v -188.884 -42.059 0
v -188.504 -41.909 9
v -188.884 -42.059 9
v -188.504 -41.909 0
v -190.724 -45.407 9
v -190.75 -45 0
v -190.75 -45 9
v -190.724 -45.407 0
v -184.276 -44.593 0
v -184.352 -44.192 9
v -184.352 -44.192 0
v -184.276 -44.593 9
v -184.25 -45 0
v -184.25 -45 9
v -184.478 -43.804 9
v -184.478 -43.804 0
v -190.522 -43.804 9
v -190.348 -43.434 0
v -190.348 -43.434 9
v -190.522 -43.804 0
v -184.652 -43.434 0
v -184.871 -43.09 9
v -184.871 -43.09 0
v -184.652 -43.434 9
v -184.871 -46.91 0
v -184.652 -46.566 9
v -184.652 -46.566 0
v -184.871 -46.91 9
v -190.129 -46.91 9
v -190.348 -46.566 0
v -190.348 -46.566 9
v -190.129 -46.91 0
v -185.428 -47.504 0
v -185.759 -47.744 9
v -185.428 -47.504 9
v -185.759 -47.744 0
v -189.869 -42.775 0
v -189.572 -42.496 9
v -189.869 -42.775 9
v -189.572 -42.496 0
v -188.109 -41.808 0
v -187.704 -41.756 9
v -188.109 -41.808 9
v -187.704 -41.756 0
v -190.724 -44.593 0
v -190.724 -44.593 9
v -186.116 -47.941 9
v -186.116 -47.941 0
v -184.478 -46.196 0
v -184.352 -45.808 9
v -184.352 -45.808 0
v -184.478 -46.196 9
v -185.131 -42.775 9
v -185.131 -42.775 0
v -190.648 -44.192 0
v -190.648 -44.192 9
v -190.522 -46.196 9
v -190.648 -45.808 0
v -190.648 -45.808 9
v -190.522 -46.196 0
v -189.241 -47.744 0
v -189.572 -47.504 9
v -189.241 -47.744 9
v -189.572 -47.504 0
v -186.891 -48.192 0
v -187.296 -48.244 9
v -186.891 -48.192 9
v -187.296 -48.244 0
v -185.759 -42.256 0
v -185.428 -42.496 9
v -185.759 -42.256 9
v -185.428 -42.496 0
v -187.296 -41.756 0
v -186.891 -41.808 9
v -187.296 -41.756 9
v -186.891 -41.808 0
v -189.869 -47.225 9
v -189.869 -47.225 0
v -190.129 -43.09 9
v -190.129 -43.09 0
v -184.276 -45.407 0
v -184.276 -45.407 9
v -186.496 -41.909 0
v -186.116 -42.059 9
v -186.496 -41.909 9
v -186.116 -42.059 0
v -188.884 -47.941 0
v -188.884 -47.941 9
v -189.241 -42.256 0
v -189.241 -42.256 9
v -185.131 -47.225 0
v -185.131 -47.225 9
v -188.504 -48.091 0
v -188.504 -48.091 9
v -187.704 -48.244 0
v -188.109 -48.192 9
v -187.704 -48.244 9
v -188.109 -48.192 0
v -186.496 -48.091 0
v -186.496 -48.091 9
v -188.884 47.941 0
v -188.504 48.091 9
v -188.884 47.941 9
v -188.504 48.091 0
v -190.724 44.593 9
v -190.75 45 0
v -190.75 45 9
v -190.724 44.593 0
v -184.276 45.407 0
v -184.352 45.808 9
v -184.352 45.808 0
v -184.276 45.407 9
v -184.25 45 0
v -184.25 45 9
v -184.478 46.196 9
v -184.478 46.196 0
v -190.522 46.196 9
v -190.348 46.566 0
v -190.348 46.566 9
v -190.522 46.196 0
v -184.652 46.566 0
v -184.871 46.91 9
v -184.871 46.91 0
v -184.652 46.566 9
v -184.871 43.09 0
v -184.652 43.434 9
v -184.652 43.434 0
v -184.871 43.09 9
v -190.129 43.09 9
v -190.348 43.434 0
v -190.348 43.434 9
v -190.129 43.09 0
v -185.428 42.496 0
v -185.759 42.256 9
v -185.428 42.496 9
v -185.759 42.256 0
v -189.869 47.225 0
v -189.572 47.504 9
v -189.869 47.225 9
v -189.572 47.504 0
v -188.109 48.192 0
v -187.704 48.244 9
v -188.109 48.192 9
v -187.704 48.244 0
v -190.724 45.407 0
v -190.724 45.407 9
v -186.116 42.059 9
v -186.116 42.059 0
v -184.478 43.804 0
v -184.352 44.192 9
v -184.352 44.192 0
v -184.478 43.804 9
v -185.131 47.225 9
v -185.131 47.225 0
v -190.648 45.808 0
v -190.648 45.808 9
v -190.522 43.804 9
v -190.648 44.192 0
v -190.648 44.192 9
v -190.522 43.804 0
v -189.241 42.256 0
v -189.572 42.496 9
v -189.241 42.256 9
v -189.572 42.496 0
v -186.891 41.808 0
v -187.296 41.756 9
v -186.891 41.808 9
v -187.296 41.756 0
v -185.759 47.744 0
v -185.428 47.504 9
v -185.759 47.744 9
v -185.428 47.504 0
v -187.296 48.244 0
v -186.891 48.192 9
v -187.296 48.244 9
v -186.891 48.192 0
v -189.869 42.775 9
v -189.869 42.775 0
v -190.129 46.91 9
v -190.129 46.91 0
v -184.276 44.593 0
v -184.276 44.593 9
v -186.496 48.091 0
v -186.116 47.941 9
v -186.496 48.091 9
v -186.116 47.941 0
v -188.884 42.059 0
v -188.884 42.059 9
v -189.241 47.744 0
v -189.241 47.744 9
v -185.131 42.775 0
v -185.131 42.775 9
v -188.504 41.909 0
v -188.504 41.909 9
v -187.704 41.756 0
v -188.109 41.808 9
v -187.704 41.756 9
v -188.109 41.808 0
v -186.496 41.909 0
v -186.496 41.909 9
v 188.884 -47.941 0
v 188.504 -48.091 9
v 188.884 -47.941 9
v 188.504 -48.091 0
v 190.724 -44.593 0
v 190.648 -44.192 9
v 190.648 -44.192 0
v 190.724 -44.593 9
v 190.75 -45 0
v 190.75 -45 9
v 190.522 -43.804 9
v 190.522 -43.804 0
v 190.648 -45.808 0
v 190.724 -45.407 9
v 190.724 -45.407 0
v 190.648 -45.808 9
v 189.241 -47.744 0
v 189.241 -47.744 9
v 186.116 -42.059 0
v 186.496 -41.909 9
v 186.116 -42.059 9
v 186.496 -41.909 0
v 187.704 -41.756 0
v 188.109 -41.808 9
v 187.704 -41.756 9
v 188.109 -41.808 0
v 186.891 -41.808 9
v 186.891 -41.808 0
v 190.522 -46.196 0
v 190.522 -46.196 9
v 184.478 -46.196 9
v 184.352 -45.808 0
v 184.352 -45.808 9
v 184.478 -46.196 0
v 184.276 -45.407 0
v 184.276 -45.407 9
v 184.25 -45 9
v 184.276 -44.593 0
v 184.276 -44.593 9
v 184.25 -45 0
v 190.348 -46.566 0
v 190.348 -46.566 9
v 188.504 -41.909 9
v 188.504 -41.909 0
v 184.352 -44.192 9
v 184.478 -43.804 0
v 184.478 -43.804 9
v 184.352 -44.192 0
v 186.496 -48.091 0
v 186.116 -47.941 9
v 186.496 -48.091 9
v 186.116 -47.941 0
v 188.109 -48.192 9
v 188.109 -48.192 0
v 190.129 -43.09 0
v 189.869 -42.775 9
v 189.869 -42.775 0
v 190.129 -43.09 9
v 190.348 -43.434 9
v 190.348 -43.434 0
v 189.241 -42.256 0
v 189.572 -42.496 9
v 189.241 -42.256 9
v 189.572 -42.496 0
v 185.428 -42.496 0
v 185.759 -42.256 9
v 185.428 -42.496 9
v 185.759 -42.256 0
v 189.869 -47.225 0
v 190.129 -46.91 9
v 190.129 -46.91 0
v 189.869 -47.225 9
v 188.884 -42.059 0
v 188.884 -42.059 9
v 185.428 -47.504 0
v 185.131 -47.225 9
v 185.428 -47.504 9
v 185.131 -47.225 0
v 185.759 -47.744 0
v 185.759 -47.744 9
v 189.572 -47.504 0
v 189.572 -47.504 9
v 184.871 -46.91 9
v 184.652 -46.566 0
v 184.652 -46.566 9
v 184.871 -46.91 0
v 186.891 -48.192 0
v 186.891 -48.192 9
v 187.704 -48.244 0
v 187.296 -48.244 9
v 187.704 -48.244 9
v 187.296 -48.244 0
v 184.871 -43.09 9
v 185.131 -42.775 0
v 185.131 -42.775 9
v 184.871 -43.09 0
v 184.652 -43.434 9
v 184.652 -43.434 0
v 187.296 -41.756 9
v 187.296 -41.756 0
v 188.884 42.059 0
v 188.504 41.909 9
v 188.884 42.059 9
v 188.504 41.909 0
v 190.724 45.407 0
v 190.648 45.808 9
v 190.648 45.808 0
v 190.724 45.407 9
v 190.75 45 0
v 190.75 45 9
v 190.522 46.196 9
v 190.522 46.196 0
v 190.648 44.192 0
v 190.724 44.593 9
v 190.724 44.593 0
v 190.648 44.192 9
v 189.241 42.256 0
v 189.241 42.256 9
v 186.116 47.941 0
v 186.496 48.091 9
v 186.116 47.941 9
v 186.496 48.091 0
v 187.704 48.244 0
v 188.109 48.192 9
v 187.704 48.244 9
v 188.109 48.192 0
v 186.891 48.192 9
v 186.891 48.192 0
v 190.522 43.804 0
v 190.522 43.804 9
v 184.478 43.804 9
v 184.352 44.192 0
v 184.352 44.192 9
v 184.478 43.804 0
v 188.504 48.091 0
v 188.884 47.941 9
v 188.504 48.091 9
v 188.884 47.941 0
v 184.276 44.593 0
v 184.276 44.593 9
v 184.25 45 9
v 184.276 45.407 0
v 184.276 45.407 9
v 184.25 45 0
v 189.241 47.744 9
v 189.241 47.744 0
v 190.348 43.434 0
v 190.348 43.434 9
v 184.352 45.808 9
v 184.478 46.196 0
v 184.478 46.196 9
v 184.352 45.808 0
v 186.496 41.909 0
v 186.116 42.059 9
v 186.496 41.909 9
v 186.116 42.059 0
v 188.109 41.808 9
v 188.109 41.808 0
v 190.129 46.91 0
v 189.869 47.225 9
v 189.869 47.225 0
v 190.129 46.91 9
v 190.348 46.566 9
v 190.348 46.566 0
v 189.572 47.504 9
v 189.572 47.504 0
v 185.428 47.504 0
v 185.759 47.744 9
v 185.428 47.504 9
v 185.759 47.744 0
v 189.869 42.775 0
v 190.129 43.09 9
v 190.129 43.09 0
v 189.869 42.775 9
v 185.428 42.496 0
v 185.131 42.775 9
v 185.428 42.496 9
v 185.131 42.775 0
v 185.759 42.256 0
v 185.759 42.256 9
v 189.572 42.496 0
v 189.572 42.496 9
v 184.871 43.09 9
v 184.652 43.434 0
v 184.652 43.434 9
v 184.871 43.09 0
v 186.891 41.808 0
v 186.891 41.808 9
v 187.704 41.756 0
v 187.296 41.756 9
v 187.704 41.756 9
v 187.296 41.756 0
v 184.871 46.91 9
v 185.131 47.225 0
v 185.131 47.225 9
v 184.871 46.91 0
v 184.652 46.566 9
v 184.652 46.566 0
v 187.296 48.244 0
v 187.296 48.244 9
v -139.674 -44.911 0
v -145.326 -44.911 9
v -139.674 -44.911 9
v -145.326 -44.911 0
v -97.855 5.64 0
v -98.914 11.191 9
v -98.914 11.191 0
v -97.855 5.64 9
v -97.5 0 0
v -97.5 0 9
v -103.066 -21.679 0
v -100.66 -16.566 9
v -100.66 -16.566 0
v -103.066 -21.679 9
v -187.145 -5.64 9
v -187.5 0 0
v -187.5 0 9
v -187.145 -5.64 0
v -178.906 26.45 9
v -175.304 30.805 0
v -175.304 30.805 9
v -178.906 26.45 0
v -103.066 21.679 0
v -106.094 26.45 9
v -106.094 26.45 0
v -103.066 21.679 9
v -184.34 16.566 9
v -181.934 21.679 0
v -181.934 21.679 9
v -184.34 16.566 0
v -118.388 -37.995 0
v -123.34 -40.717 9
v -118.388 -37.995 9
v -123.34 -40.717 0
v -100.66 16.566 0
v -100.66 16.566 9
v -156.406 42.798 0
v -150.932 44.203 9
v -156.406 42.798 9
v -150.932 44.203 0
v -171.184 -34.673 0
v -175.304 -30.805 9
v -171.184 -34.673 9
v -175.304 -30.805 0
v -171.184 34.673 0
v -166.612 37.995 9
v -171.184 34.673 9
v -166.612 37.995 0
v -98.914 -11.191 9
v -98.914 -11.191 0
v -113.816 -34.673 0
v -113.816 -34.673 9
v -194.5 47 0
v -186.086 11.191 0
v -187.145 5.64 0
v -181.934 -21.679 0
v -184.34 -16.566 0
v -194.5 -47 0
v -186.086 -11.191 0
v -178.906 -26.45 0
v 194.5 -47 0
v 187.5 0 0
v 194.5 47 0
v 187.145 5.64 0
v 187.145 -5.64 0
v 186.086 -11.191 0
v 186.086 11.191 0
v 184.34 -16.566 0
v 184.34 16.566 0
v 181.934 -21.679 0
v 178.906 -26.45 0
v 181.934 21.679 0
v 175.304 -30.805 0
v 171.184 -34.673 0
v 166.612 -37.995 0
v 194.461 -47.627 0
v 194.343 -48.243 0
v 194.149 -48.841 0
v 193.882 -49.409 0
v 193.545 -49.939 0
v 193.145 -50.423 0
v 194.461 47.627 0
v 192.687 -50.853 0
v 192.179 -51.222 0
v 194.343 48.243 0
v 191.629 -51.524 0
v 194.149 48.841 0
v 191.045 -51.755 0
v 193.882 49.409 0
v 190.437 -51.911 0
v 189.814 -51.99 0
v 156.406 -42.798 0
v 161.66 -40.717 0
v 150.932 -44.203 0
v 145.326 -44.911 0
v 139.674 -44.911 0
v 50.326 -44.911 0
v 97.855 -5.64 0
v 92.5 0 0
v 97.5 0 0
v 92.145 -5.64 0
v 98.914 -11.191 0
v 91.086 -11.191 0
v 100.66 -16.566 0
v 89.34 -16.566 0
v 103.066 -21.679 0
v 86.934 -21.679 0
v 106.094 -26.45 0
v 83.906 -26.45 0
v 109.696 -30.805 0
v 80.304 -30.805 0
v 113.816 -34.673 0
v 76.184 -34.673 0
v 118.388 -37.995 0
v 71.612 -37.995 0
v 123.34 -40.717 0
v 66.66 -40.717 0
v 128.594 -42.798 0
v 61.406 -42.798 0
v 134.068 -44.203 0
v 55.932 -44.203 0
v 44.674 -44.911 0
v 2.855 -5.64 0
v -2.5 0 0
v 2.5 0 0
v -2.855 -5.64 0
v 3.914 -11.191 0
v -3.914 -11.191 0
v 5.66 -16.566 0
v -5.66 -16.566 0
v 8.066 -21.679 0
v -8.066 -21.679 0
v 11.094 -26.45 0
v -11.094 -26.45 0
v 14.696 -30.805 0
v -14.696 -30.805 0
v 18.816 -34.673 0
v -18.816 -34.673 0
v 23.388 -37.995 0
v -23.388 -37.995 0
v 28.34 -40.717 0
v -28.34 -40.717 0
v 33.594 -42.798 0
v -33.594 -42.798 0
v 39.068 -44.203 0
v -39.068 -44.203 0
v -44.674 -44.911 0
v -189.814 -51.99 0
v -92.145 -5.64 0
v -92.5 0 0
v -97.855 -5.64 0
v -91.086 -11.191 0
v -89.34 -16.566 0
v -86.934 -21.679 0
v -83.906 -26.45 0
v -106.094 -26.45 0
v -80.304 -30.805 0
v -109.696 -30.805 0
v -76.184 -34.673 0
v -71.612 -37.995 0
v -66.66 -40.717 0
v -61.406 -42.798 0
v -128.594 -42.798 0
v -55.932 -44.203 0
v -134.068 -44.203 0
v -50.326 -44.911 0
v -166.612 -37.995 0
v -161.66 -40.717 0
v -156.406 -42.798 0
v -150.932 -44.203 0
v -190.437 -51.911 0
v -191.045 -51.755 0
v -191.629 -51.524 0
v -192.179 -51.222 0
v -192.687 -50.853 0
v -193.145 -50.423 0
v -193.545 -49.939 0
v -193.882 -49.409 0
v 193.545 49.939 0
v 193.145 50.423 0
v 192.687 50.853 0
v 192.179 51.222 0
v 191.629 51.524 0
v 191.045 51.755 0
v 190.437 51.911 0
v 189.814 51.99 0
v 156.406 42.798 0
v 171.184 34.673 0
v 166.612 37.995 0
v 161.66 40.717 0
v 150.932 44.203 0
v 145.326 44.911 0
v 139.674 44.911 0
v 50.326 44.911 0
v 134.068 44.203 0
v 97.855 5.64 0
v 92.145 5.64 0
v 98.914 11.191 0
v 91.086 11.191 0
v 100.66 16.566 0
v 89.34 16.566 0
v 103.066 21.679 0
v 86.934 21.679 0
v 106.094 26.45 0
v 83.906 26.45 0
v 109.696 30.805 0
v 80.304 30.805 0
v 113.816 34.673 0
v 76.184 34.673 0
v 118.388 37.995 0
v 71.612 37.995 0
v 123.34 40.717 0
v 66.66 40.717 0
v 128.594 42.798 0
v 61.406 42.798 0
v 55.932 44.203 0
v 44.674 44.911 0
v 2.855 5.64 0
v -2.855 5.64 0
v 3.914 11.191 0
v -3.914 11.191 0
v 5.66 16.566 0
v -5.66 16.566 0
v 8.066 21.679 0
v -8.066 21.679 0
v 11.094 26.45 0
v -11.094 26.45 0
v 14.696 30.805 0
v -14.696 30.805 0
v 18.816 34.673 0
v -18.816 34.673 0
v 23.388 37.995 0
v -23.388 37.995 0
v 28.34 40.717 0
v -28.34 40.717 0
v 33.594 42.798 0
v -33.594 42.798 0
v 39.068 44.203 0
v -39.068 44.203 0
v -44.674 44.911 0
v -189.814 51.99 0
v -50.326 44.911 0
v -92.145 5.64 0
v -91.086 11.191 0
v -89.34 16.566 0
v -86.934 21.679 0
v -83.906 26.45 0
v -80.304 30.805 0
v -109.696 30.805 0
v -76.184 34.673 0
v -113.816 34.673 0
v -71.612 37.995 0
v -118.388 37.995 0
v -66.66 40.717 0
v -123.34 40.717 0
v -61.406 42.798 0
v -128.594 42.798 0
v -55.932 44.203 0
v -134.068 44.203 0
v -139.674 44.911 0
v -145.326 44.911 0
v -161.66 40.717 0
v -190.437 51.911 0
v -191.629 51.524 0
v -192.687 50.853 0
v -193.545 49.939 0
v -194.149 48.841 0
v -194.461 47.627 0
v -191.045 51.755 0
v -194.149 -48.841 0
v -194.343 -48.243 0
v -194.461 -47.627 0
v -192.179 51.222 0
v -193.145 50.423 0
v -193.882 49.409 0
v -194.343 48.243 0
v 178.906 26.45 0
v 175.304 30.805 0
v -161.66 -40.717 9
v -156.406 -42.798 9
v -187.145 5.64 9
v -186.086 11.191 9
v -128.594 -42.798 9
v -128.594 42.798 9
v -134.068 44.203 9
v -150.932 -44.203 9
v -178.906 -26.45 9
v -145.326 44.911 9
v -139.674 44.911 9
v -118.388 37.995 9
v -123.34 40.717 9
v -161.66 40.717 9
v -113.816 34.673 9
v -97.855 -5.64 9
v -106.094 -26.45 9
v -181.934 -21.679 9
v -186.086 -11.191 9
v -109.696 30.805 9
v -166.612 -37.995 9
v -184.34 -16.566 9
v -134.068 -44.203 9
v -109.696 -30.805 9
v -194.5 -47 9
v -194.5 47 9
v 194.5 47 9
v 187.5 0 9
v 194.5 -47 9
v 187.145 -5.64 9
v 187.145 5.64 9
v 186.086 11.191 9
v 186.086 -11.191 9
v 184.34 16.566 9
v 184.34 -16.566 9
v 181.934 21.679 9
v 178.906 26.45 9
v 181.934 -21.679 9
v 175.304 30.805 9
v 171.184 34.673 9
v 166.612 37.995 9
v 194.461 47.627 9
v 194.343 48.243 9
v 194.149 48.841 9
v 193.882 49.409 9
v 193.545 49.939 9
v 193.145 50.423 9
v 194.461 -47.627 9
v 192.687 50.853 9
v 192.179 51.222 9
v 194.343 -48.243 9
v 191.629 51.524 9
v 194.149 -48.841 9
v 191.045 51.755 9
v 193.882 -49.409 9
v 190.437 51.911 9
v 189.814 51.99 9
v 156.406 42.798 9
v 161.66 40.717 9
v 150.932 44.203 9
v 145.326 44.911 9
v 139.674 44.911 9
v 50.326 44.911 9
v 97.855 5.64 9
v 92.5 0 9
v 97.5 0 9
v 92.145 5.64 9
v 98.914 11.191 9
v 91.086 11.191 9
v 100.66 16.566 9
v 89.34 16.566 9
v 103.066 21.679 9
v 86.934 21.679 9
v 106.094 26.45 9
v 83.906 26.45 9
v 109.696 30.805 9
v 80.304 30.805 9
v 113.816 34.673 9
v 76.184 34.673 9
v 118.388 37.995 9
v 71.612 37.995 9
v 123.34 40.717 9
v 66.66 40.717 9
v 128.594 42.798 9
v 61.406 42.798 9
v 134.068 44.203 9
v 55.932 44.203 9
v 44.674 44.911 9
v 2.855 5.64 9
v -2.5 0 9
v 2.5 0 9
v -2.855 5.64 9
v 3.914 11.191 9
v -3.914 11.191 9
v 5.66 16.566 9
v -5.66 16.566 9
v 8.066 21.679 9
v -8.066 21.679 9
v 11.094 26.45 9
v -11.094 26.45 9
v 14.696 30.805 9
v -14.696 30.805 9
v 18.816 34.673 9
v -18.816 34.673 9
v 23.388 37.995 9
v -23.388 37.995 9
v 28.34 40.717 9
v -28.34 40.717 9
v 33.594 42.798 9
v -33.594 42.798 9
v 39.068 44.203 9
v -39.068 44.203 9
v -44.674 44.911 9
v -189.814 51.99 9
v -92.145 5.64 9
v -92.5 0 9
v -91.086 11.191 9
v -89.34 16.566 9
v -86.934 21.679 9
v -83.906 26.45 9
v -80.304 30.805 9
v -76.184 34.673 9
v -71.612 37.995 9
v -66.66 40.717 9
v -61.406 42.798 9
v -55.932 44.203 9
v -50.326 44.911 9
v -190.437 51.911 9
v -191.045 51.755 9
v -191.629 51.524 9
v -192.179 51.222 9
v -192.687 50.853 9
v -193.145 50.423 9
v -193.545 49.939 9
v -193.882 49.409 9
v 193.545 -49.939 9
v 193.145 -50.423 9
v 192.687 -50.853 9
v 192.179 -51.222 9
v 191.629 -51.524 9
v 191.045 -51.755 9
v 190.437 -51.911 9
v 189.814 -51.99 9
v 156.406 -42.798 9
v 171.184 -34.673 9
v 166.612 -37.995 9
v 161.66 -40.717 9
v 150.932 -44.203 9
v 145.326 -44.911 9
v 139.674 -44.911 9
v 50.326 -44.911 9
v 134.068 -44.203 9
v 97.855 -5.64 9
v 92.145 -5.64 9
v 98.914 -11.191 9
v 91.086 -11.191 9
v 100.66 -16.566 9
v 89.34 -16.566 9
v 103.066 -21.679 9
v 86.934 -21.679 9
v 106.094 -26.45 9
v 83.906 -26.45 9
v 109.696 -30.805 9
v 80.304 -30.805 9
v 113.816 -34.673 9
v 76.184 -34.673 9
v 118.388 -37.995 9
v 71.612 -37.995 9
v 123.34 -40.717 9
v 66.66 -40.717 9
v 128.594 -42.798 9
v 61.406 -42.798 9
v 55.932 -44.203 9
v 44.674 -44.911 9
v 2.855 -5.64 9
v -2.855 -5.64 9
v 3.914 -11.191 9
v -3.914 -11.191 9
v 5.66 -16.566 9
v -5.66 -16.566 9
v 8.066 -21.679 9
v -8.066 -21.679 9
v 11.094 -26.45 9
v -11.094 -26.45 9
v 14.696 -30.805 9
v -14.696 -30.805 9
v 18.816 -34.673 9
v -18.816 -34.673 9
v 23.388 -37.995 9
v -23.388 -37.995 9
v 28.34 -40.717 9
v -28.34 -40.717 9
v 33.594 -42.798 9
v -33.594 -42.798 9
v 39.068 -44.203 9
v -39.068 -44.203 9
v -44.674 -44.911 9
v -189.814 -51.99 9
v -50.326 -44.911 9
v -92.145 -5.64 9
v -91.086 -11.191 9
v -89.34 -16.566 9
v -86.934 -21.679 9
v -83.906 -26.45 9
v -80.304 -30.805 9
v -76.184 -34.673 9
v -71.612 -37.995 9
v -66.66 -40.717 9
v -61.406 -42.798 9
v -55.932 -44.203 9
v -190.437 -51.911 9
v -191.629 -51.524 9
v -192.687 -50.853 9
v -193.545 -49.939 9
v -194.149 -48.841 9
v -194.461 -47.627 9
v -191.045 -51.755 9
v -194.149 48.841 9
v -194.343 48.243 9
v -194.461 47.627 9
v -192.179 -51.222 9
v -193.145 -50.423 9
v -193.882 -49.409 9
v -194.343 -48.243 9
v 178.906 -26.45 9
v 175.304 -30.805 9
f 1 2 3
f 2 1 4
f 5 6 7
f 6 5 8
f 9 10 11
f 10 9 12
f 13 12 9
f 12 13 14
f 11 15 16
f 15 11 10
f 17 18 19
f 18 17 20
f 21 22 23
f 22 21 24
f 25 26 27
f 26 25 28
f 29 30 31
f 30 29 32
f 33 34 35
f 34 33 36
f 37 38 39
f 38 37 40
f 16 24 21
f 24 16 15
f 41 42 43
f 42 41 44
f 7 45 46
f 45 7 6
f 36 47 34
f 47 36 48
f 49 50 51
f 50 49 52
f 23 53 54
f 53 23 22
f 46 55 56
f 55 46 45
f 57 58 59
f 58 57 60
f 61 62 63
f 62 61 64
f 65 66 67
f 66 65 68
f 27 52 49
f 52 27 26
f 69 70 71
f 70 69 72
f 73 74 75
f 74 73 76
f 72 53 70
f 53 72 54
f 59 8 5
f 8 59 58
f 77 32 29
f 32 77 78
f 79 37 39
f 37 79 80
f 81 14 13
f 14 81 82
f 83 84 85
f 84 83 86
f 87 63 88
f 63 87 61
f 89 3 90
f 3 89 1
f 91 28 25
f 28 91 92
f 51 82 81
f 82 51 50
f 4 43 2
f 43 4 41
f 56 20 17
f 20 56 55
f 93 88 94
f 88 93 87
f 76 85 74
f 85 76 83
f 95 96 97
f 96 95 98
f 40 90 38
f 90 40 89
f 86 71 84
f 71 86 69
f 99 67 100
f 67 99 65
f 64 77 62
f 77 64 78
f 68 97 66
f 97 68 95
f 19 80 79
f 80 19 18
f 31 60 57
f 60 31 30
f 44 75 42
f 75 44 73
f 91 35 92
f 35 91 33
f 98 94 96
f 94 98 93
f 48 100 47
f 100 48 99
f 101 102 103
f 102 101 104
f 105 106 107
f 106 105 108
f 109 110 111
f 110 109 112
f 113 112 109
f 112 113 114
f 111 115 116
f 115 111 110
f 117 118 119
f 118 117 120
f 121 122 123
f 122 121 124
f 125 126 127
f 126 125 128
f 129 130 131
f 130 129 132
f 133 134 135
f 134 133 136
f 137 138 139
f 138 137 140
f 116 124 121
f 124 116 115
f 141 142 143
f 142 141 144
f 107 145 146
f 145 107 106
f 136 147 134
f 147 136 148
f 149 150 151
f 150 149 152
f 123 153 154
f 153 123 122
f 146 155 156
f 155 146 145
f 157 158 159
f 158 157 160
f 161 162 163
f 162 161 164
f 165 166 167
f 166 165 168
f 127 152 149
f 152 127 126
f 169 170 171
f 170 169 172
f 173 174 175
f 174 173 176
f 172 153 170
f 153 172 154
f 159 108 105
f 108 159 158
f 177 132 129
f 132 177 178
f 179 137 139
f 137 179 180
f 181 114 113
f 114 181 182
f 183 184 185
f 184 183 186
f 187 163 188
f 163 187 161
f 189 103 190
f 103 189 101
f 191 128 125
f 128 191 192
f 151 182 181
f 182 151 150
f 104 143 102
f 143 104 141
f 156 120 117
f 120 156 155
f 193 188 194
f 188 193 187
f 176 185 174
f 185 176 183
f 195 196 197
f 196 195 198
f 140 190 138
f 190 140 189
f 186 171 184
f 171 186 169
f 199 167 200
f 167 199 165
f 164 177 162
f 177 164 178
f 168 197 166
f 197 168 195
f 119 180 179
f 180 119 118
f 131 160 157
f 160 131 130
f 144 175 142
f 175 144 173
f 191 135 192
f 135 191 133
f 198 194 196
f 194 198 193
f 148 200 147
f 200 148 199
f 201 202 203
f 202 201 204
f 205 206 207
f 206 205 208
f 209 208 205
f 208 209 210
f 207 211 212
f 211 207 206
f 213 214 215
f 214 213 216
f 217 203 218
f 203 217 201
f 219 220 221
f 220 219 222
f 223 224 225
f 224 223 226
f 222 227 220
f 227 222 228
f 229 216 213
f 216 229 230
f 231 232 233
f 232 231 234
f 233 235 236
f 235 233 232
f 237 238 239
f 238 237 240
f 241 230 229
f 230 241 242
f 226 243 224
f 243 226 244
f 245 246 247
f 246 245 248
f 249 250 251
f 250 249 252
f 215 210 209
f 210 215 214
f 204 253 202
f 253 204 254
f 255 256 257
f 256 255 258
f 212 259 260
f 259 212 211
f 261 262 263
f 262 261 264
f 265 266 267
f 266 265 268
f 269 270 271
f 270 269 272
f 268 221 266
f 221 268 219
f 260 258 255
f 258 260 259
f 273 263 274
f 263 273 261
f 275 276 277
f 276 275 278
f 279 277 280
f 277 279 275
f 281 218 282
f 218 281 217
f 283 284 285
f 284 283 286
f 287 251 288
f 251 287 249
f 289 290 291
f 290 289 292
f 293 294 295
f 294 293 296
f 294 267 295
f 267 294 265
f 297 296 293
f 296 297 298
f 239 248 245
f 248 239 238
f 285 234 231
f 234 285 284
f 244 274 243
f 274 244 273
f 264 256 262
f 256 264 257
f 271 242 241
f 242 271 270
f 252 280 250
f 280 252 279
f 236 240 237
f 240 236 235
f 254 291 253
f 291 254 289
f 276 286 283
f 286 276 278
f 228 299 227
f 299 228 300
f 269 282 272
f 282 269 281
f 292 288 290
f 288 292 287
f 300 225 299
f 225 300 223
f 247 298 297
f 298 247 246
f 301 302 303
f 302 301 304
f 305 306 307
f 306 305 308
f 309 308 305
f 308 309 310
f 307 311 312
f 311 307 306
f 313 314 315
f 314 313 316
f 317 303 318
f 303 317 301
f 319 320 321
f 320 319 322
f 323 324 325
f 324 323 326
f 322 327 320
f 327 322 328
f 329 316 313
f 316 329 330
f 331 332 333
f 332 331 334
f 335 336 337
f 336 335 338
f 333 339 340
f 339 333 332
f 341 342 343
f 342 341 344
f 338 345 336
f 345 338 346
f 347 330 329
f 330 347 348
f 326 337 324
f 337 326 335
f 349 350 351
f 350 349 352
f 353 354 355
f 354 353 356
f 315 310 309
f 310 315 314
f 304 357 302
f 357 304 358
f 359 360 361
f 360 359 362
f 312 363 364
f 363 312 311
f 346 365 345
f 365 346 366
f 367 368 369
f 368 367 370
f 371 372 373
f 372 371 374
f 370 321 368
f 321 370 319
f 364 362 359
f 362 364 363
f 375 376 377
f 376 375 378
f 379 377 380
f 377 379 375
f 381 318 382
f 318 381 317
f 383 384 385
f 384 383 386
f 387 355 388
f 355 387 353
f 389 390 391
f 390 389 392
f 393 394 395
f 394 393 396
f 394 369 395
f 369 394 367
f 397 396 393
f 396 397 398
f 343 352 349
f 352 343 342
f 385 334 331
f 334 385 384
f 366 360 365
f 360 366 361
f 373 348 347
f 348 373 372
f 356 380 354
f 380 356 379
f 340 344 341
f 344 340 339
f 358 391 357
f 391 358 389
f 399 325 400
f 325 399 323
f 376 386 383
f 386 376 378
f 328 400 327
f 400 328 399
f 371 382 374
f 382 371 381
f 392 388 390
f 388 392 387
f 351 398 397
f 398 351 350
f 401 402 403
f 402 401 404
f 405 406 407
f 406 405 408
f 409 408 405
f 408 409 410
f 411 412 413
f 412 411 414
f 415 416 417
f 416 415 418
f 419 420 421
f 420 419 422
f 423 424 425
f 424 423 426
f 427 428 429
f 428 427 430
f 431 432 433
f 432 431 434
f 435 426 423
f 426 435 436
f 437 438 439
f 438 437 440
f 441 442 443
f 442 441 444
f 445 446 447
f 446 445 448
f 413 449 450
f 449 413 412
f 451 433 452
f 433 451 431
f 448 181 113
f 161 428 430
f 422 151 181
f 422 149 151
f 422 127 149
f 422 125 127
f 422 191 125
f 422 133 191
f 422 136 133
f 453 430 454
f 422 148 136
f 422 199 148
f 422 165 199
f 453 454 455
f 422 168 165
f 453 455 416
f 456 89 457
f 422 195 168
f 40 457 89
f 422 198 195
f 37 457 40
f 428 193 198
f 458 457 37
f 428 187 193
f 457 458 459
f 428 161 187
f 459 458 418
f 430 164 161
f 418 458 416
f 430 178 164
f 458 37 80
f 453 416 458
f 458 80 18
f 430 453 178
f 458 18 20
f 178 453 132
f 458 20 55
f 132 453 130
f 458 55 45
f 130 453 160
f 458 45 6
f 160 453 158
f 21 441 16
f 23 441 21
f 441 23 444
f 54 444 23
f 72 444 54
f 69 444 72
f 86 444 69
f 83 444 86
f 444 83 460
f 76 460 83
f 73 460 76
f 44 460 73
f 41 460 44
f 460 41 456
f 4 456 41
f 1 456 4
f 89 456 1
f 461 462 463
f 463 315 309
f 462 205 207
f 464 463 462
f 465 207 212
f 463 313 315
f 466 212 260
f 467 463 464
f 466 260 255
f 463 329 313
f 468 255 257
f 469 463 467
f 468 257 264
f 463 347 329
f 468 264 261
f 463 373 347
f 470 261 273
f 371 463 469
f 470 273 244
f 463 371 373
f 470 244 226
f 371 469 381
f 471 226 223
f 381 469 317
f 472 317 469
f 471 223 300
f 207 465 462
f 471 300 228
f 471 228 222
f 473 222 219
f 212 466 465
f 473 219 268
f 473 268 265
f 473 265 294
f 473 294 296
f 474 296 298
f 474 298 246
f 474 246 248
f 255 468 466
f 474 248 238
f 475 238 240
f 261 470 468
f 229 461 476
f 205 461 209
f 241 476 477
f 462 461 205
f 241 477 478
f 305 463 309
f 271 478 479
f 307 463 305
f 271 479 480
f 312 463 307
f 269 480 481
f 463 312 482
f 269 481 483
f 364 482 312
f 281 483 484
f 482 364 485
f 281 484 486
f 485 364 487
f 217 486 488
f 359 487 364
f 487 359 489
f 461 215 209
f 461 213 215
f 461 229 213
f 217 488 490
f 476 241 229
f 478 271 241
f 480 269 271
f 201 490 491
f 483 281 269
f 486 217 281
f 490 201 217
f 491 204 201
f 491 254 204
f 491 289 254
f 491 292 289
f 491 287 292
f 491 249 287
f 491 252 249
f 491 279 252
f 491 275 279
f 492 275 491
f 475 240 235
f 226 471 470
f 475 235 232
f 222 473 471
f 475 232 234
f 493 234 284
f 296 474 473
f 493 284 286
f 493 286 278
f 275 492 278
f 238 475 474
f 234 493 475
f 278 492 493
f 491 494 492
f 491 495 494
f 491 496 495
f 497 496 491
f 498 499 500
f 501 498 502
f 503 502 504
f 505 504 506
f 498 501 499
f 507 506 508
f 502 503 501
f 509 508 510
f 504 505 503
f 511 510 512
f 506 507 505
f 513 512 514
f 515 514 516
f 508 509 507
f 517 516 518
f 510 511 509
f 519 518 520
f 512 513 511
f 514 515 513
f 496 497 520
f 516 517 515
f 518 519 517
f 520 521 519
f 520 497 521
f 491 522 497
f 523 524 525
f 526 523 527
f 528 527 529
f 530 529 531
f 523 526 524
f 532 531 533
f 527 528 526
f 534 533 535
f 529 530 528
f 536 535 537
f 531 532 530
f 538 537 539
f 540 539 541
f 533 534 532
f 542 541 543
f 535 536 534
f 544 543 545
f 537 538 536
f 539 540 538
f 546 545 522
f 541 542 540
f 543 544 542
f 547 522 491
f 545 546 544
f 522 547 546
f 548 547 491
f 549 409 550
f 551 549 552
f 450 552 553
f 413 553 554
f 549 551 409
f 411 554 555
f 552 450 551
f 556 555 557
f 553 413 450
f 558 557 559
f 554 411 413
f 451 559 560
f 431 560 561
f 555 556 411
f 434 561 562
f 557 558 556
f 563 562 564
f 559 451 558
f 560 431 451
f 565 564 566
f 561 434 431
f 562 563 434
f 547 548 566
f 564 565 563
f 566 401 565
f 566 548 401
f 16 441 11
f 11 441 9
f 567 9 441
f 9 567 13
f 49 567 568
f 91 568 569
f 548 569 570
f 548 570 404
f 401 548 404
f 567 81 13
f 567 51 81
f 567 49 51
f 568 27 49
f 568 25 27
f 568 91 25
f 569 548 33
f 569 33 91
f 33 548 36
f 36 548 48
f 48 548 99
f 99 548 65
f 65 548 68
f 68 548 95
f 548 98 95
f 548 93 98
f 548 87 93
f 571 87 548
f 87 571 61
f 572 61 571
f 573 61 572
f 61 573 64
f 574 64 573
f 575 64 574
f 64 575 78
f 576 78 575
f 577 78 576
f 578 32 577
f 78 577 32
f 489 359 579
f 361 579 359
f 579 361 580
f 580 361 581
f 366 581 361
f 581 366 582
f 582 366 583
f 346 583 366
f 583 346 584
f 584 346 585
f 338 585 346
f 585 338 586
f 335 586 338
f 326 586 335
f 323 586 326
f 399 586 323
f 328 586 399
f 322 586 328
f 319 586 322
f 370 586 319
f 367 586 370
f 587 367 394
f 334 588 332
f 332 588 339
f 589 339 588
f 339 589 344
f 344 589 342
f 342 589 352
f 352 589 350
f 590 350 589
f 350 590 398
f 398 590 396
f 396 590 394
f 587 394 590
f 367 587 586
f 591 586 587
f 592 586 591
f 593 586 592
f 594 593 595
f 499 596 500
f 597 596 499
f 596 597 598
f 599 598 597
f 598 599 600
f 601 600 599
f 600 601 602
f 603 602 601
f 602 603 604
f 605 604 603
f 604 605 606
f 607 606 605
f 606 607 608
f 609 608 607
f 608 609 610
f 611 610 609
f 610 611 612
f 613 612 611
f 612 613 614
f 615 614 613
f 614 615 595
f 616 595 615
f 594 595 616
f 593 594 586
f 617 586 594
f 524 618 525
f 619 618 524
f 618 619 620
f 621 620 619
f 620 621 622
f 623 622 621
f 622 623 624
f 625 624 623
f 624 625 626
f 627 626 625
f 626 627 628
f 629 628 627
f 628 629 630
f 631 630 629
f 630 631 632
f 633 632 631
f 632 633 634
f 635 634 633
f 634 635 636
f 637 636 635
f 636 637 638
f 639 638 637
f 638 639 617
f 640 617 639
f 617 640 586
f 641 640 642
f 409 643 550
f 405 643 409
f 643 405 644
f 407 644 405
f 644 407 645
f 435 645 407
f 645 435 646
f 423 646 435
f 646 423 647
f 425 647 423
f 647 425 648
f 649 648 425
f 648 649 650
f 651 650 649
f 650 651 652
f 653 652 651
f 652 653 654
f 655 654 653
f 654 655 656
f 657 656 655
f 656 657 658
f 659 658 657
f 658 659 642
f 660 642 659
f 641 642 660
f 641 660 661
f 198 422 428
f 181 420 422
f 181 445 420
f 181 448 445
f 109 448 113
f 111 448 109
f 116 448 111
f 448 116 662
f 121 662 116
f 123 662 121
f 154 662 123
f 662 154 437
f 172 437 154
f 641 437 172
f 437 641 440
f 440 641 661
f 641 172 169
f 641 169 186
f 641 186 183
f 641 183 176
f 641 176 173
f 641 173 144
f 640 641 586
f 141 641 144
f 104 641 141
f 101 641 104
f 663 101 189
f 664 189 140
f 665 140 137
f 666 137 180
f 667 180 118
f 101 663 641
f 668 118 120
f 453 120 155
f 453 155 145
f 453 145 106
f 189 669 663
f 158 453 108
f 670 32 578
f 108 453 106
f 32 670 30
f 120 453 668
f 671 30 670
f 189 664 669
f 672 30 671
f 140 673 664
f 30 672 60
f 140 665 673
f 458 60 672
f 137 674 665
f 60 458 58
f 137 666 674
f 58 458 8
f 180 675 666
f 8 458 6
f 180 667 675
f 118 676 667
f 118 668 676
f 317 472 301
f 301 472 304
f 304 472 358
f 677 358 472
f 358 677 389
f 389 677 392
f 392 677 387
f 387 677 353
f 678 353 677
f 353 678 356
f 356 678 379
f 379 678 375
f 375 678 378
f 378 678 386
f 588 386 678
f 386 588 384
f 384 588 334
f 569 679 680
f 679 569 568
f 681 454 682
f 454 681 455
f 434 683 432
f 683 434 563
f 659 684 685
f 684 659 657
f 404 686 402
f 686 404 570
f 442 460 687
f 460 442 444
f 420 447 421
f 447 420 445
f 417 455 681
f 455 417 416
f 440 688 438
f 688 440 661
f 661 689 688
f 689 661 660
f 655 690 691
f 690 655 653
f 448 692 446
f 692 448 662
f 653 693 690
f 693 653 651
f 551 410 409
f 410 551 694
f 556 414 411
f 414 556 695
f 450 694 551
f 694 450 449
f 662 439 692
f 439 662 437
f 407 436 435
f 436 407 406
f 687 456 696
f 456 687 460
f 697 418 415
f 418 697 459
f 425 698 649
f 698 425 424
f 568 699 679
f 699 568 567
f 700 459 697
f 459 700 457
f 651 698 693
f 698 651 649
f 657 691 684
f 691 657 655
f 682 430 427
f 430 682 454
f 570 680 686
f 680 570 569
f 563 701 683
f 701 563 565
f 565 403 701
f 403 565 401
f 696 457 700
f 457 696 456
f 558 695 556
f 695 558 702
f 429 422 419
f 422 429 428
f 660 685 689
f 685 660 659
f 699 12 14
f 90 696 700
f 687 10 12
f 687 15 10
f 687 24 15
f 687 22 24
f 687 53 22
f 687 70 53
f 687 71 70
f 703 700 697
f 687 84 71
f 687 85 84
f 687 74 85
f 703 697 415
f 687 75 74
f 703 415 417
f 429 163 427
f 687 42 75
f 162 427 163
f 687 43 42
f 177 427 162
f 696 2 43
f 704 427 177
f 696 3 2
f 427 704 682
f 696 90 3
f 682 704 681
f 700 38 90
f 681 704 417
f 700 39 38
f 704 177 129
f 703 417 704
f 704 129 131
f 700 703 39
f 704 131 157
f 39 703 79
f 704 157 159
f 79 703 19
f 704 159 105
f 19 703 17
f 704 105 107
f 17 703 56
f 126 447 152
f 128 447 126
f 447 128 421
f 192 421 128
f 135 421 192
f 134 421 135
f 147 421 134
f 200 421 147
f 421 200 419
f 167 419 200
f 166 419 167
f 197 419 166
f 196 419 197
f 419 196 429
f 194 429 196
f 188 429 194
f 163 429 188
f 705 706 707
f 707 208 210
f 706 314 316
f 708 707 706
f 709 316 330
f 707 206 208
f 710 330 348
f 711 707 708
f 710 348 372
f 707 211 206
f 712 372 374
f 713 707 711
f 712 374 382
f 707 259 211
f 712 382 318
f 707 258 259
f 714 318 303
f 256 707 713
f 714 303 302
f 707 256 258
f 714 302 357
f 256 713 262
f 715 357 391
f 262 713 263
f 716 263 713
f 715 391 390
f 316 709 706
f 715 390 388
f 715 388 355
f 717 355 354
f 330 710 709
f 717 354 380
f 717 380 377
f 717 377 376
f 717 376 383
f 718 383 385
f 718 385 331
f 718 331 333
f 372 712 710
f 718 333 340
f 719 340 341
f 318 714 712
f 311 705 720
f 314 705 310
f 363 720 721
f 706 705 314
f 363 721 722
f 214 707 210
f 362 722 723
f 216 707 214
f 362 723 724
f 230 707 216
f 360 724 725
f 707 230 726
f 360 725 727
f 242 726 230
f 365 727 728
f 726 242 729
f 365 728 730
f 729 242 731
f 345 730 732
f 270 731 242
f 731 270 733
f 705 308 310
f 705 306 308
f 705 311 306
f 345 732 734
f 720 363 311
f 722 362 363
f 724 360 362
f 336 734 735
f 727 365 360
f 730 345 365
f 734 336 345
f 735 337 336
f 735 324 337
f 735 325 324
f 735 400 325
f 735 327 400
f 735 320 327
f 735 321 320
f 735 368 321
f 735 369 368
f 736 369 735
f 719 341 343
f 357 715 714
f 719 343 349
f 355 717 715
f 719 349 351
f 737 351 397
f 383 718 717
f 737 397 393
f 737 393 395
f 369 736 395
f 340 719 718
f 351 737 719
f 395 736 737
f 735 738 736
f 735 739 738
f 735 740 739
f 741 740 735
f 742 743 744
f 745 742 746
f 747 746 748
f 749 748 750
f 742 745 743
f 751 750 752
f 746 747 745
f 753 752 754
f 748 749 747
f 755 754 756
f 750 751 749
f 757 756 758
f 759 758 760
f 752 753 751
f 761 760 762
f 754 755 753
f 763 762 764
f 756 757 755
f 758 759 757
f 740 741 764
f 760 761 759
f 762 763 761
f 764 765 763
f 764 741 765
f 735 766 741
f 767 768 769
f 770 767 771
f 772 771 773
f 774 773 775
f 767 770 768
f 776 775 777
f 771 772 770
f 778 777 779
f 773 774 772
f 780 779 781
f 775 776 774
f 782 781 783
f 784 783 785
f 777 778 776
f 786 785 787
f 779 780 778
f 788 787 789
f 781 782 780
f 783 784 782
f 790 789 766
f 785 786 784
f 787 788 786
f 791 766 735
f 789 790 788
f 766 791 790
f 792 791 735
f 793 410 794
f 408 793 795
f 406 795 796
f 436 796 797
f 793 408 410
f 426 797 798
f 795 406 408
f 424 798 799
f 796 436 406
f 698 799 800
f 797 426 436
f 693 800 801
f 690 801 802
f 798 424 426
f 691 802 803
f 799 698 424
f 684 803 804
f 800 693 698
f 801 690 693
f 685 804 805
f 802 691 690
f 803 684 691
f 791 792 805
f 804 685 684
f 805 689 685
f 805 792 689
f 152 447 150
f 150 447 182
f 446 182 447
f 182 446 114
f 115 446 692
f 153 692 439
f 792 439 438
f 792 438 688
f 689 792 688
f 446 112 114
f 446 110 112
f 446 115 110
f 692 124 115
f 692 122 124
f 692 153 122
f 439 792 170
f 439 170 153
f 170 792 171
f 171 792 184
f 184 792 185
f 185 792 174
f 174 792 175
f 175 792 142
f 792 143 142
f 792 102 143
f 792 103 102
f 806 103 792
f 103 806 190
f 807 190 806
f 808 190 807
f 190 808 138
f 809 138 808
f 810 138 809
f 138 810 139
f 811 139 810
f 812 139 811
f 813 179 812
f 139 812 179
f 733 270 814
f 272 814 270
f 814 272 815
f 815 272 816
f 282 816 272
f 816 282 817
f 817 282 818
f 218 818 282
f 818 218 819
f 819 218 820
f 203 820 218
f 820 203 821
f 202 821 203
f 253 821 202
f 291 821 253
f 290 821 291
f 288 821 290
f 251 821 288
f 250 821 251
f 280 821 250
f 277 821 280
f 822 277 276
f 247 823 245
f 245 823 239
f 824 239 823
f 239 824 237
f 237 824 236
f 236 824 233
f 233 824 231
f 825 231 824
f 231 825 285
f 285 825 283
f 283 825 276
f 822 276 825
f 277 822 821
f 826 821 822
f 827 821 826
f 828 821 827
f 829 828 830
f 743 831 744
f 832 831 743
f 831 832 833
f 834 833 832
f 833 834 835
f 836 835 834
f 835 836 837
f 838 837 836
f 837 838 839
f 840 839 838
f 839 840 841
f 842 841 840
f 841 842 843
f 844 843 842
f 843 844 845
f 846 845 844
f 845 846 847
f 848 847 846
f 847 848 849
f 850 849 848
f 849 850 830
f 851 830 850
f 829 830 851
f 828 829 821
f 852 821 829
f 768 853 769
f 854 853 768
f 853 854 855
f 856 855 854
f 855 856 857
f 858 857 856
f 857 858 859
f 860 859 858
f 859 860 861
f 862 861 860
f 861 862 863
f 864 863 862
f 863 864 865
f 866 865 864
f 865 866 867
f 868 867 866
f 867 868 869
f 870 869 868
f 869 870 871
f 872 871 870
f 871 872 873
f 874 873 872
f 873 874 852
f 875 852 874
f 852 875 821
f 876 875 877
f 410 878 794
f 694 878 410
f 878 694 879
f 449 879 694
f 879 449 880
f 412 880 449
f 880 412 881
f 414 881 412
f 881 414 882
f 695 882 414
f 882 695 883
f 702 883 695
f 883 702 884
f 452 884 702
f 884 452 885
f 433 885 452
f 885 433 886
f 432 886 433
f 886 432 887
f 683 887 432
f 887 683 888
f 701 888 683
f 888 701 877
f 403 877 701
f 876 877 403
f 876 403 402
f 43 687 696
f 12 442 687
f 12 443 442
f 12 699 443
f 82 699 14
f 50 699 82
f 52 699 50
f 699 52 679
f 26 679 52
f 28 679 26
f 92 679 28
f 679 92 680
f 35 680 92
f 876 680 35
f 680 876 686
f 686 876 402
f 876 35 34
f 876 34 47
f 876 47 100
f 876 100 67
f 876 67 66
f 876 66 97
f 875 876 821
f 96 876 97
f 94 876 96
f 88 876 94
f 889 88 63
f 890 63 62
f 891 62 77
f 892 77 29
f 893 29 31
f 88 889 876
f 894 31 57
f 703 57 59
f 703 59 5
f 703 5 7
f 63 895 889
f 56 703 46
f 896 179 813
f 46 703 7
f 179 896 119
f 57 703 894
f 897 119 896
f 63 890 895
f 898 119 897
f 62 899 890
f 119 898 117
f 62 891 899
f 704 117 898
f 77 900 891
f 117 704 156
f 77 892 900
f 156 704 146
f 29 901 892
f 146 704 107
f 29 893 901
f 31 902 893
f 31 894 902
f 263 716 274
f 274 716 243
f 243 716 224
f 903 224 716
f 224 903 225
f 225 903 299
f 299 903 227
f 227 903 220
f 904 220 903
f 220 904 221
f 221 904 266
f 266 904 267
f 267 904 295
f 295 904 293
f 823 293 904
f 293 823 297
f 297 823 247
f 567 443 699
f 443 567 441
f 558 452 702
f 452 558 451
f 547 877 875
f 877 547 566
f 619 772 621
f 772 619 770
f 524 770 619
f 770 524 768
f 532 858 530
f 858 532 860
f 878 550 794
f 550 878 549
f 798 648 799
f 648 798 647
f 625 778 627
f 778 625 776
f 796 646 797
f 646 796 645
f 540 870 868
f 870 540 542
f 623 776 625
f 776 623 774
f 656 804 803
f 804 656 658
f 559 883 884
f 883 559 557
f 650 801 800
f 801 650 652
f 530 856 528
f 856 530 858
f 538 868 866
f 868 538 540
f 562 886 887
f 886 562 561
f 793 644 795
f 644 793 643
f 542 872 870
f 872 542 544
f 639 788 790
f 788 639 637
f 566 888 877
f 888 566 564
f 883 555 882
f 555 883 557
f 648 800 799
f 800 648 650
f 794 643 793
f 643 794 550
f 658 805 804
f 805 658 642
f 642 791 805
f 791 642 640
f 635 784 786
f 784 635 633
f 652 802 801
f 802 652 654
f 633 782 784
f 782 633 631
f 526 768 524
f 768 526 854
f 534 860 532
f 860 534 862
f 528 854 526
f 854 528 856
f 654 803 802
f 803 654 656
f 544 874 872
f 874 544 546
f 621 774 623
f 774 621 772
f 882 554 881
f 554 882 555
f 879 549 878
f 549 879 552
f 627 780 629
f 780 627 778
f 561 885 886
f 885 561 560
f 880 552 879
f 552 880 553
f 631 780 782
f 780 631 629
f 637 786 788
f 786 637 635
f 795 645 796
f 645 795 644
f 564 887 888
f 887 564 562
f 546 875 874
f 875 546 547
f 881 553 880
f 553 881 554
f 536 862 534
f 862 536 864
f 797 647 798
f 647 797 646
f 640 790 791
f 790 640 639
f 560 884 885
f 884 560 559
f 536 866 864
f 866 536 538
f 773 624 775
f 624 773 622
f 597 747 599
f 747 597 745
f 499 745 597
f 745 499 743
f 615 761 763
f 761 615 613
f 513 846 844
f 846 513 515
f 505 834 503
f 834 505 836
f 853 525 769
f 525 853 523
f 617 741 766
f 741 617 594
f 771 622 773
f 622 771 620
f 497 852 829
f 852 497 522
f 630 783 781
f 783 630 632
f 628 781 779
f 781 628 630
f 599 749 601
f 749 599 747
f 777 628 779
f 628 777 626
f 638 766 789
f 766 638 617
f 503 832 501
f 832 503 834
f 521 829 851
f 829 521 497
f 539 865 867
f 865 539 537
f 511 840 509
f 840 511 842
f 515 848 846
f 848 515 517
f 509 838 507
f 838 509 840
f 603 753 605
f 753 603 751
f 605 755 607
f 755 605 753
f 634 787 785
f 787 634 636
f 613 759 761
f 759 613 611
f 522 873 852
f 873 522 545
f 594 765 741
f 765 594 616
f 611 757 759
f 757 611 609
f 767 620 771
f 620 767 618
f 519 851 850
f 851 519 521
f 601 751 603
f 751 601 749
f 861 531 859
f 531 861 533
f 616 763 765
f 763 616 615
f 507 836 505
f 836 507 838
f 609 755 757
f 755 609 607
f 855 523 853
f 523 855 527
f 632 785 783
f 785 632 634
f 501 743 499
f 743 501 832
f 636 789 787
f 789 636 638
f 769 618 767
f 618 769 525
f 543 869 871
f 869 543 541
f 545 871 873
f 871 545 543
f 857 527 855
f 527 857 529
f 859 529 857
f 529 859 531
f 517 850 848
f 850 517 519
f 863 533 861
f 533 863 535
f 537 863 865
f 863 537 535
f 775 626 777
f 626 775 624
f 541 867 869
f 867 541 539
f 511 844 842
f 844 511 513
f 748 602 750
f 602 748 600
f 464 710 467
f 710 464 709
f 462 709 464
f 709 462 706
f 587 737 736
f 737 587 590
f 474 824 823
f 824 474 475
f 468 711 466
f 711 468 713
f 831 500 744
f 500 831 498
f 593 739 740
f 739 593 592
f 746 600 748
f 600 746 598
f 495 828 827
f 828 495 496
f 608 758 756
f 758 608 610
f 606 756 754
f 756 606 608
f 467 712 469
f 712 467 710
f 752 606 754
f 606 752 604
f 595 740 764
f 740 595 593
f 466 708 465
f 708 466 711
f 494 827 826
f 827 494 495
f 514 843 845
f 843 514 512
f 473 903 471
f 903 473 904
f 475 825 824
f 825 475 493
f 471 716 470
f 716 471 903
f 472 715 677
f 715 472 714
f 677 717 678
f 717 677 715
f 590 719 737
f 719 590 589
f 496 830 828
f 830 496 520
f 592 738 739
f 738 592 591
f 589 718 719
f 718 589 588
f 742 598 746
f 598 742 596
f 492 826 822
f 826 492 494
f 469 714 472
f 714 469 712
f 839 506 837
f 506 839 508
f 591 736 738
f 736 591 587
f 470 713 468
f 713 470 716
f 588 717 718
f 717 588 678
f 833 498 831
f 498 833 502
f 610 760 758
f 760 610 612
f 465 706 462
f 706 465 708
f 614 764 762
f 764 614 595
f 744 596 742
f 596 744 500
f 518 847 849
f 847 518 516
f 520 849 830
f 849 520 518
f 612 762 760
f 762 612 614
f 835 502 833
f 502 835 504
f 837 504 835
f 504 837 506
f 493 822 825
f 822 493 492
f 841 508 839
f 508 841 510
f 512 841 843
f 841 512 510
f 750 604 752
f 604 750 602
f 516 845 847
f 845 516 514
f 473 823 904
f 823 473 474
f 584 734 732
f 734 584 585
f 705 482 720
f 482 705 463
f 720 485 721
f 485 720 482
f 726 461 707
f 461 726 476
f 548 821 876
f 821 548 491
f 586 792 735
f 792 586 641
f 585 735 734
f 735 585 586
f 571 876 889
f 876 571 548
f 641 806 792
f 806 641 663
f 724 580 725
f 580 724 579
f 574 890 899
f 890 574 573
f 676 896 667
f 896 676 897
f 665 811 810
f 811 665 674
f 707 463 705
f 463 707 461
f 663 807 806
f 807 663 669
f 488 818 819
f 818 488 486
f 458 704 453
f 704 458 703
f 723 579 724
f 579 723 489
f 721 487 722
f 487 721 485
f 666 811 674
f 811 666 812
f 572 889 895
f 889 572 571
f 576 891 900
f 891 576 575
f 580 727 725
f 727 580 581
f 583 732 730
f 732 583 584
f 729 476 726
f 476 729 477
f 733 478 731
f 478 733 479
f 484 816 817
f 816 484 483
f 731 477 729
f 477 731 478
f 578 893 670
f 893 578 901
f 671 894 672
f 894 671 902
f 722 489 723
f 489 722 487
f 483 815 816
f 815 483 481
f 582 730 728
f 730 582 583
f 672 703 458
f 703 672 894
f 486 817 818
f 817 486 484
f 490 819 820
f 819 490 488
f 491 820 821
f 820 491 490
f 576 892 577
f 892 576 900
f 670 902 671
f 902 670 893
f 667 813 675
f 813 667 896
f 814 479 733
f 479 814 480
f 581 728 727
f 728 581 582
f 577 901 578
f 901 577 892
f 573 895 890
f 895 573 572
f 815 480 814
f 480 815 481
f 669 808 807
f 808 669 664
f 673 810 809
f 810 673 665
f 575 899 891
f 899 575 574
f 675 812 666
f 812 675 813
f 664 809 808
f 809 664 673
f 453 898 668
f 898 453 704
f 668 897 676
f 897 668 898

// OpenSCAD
$fn = 50;

difference() {
	union() {
		hull() {
			translate(v = [-189.5, 47.0, 0]) {
				cylinder(h = 9, r = 5);
			}
			translate(v = [189.5, 47.0, 0]) {
				cylinder(h = 9, r = 5);
			}
			translate(v = [-189.5, -47.0, 0]) {
				cylinder(h = 9, r = 5);
			}
			translate(v = [189.5, -47.0, 0]) {
				cylinder(h = 9, r = 5);
			}
		}
	}
	union() {
		translate(v = [-187.5, -45.0, -100.0]) {
			cylinder(h = 200, r = 3.25);
		}
		translate(v = [-187.5, 45.0, -100.0]) {
			cylinder(h = 200, r = 3.25);
		}
		translate(v = [187.5, -45.0, -100.0]) {
			cylinder(h = 200, r = 3.25);
		}
		translate(v = [187.5, 45.0, -100.0]) {
			cylinder(h = 200, r = 3.25);
		}
		translate(v = [-187.5, -45.0, -100.0]) {
			cylinder(h = 200, r = 1.8);
		}
		translate(v = [-187.5, 45.0, -100.0]) {
			cylinder(h = 200, r = 1.8);
		}
		translate(v = [187.5, -45.0, -100.0]) {
			cylinder(h = 200, r = 1.8);
		}
		translate(v = [187.5, 45.0, -100.0]) {
			cylinder(h = 200, r = 1.8);
		}
		translate(v = [-142.5, 0, 0.0]) {
			cylinder(h = 9, r = 45.0);
		}
		translate(v = [-47.5, 0, 0.0]) {
			cylinder(h = 9, r = 45.0);
		}
		translate(v = [47.5, 0, 0.0]) {
			cylinder(h = 9, r = 45.0);
		}
		translate(v = [142.5, 0, 0.0]) {
			cylinder(h = 9, r = 45.0);
		}
	}
}
